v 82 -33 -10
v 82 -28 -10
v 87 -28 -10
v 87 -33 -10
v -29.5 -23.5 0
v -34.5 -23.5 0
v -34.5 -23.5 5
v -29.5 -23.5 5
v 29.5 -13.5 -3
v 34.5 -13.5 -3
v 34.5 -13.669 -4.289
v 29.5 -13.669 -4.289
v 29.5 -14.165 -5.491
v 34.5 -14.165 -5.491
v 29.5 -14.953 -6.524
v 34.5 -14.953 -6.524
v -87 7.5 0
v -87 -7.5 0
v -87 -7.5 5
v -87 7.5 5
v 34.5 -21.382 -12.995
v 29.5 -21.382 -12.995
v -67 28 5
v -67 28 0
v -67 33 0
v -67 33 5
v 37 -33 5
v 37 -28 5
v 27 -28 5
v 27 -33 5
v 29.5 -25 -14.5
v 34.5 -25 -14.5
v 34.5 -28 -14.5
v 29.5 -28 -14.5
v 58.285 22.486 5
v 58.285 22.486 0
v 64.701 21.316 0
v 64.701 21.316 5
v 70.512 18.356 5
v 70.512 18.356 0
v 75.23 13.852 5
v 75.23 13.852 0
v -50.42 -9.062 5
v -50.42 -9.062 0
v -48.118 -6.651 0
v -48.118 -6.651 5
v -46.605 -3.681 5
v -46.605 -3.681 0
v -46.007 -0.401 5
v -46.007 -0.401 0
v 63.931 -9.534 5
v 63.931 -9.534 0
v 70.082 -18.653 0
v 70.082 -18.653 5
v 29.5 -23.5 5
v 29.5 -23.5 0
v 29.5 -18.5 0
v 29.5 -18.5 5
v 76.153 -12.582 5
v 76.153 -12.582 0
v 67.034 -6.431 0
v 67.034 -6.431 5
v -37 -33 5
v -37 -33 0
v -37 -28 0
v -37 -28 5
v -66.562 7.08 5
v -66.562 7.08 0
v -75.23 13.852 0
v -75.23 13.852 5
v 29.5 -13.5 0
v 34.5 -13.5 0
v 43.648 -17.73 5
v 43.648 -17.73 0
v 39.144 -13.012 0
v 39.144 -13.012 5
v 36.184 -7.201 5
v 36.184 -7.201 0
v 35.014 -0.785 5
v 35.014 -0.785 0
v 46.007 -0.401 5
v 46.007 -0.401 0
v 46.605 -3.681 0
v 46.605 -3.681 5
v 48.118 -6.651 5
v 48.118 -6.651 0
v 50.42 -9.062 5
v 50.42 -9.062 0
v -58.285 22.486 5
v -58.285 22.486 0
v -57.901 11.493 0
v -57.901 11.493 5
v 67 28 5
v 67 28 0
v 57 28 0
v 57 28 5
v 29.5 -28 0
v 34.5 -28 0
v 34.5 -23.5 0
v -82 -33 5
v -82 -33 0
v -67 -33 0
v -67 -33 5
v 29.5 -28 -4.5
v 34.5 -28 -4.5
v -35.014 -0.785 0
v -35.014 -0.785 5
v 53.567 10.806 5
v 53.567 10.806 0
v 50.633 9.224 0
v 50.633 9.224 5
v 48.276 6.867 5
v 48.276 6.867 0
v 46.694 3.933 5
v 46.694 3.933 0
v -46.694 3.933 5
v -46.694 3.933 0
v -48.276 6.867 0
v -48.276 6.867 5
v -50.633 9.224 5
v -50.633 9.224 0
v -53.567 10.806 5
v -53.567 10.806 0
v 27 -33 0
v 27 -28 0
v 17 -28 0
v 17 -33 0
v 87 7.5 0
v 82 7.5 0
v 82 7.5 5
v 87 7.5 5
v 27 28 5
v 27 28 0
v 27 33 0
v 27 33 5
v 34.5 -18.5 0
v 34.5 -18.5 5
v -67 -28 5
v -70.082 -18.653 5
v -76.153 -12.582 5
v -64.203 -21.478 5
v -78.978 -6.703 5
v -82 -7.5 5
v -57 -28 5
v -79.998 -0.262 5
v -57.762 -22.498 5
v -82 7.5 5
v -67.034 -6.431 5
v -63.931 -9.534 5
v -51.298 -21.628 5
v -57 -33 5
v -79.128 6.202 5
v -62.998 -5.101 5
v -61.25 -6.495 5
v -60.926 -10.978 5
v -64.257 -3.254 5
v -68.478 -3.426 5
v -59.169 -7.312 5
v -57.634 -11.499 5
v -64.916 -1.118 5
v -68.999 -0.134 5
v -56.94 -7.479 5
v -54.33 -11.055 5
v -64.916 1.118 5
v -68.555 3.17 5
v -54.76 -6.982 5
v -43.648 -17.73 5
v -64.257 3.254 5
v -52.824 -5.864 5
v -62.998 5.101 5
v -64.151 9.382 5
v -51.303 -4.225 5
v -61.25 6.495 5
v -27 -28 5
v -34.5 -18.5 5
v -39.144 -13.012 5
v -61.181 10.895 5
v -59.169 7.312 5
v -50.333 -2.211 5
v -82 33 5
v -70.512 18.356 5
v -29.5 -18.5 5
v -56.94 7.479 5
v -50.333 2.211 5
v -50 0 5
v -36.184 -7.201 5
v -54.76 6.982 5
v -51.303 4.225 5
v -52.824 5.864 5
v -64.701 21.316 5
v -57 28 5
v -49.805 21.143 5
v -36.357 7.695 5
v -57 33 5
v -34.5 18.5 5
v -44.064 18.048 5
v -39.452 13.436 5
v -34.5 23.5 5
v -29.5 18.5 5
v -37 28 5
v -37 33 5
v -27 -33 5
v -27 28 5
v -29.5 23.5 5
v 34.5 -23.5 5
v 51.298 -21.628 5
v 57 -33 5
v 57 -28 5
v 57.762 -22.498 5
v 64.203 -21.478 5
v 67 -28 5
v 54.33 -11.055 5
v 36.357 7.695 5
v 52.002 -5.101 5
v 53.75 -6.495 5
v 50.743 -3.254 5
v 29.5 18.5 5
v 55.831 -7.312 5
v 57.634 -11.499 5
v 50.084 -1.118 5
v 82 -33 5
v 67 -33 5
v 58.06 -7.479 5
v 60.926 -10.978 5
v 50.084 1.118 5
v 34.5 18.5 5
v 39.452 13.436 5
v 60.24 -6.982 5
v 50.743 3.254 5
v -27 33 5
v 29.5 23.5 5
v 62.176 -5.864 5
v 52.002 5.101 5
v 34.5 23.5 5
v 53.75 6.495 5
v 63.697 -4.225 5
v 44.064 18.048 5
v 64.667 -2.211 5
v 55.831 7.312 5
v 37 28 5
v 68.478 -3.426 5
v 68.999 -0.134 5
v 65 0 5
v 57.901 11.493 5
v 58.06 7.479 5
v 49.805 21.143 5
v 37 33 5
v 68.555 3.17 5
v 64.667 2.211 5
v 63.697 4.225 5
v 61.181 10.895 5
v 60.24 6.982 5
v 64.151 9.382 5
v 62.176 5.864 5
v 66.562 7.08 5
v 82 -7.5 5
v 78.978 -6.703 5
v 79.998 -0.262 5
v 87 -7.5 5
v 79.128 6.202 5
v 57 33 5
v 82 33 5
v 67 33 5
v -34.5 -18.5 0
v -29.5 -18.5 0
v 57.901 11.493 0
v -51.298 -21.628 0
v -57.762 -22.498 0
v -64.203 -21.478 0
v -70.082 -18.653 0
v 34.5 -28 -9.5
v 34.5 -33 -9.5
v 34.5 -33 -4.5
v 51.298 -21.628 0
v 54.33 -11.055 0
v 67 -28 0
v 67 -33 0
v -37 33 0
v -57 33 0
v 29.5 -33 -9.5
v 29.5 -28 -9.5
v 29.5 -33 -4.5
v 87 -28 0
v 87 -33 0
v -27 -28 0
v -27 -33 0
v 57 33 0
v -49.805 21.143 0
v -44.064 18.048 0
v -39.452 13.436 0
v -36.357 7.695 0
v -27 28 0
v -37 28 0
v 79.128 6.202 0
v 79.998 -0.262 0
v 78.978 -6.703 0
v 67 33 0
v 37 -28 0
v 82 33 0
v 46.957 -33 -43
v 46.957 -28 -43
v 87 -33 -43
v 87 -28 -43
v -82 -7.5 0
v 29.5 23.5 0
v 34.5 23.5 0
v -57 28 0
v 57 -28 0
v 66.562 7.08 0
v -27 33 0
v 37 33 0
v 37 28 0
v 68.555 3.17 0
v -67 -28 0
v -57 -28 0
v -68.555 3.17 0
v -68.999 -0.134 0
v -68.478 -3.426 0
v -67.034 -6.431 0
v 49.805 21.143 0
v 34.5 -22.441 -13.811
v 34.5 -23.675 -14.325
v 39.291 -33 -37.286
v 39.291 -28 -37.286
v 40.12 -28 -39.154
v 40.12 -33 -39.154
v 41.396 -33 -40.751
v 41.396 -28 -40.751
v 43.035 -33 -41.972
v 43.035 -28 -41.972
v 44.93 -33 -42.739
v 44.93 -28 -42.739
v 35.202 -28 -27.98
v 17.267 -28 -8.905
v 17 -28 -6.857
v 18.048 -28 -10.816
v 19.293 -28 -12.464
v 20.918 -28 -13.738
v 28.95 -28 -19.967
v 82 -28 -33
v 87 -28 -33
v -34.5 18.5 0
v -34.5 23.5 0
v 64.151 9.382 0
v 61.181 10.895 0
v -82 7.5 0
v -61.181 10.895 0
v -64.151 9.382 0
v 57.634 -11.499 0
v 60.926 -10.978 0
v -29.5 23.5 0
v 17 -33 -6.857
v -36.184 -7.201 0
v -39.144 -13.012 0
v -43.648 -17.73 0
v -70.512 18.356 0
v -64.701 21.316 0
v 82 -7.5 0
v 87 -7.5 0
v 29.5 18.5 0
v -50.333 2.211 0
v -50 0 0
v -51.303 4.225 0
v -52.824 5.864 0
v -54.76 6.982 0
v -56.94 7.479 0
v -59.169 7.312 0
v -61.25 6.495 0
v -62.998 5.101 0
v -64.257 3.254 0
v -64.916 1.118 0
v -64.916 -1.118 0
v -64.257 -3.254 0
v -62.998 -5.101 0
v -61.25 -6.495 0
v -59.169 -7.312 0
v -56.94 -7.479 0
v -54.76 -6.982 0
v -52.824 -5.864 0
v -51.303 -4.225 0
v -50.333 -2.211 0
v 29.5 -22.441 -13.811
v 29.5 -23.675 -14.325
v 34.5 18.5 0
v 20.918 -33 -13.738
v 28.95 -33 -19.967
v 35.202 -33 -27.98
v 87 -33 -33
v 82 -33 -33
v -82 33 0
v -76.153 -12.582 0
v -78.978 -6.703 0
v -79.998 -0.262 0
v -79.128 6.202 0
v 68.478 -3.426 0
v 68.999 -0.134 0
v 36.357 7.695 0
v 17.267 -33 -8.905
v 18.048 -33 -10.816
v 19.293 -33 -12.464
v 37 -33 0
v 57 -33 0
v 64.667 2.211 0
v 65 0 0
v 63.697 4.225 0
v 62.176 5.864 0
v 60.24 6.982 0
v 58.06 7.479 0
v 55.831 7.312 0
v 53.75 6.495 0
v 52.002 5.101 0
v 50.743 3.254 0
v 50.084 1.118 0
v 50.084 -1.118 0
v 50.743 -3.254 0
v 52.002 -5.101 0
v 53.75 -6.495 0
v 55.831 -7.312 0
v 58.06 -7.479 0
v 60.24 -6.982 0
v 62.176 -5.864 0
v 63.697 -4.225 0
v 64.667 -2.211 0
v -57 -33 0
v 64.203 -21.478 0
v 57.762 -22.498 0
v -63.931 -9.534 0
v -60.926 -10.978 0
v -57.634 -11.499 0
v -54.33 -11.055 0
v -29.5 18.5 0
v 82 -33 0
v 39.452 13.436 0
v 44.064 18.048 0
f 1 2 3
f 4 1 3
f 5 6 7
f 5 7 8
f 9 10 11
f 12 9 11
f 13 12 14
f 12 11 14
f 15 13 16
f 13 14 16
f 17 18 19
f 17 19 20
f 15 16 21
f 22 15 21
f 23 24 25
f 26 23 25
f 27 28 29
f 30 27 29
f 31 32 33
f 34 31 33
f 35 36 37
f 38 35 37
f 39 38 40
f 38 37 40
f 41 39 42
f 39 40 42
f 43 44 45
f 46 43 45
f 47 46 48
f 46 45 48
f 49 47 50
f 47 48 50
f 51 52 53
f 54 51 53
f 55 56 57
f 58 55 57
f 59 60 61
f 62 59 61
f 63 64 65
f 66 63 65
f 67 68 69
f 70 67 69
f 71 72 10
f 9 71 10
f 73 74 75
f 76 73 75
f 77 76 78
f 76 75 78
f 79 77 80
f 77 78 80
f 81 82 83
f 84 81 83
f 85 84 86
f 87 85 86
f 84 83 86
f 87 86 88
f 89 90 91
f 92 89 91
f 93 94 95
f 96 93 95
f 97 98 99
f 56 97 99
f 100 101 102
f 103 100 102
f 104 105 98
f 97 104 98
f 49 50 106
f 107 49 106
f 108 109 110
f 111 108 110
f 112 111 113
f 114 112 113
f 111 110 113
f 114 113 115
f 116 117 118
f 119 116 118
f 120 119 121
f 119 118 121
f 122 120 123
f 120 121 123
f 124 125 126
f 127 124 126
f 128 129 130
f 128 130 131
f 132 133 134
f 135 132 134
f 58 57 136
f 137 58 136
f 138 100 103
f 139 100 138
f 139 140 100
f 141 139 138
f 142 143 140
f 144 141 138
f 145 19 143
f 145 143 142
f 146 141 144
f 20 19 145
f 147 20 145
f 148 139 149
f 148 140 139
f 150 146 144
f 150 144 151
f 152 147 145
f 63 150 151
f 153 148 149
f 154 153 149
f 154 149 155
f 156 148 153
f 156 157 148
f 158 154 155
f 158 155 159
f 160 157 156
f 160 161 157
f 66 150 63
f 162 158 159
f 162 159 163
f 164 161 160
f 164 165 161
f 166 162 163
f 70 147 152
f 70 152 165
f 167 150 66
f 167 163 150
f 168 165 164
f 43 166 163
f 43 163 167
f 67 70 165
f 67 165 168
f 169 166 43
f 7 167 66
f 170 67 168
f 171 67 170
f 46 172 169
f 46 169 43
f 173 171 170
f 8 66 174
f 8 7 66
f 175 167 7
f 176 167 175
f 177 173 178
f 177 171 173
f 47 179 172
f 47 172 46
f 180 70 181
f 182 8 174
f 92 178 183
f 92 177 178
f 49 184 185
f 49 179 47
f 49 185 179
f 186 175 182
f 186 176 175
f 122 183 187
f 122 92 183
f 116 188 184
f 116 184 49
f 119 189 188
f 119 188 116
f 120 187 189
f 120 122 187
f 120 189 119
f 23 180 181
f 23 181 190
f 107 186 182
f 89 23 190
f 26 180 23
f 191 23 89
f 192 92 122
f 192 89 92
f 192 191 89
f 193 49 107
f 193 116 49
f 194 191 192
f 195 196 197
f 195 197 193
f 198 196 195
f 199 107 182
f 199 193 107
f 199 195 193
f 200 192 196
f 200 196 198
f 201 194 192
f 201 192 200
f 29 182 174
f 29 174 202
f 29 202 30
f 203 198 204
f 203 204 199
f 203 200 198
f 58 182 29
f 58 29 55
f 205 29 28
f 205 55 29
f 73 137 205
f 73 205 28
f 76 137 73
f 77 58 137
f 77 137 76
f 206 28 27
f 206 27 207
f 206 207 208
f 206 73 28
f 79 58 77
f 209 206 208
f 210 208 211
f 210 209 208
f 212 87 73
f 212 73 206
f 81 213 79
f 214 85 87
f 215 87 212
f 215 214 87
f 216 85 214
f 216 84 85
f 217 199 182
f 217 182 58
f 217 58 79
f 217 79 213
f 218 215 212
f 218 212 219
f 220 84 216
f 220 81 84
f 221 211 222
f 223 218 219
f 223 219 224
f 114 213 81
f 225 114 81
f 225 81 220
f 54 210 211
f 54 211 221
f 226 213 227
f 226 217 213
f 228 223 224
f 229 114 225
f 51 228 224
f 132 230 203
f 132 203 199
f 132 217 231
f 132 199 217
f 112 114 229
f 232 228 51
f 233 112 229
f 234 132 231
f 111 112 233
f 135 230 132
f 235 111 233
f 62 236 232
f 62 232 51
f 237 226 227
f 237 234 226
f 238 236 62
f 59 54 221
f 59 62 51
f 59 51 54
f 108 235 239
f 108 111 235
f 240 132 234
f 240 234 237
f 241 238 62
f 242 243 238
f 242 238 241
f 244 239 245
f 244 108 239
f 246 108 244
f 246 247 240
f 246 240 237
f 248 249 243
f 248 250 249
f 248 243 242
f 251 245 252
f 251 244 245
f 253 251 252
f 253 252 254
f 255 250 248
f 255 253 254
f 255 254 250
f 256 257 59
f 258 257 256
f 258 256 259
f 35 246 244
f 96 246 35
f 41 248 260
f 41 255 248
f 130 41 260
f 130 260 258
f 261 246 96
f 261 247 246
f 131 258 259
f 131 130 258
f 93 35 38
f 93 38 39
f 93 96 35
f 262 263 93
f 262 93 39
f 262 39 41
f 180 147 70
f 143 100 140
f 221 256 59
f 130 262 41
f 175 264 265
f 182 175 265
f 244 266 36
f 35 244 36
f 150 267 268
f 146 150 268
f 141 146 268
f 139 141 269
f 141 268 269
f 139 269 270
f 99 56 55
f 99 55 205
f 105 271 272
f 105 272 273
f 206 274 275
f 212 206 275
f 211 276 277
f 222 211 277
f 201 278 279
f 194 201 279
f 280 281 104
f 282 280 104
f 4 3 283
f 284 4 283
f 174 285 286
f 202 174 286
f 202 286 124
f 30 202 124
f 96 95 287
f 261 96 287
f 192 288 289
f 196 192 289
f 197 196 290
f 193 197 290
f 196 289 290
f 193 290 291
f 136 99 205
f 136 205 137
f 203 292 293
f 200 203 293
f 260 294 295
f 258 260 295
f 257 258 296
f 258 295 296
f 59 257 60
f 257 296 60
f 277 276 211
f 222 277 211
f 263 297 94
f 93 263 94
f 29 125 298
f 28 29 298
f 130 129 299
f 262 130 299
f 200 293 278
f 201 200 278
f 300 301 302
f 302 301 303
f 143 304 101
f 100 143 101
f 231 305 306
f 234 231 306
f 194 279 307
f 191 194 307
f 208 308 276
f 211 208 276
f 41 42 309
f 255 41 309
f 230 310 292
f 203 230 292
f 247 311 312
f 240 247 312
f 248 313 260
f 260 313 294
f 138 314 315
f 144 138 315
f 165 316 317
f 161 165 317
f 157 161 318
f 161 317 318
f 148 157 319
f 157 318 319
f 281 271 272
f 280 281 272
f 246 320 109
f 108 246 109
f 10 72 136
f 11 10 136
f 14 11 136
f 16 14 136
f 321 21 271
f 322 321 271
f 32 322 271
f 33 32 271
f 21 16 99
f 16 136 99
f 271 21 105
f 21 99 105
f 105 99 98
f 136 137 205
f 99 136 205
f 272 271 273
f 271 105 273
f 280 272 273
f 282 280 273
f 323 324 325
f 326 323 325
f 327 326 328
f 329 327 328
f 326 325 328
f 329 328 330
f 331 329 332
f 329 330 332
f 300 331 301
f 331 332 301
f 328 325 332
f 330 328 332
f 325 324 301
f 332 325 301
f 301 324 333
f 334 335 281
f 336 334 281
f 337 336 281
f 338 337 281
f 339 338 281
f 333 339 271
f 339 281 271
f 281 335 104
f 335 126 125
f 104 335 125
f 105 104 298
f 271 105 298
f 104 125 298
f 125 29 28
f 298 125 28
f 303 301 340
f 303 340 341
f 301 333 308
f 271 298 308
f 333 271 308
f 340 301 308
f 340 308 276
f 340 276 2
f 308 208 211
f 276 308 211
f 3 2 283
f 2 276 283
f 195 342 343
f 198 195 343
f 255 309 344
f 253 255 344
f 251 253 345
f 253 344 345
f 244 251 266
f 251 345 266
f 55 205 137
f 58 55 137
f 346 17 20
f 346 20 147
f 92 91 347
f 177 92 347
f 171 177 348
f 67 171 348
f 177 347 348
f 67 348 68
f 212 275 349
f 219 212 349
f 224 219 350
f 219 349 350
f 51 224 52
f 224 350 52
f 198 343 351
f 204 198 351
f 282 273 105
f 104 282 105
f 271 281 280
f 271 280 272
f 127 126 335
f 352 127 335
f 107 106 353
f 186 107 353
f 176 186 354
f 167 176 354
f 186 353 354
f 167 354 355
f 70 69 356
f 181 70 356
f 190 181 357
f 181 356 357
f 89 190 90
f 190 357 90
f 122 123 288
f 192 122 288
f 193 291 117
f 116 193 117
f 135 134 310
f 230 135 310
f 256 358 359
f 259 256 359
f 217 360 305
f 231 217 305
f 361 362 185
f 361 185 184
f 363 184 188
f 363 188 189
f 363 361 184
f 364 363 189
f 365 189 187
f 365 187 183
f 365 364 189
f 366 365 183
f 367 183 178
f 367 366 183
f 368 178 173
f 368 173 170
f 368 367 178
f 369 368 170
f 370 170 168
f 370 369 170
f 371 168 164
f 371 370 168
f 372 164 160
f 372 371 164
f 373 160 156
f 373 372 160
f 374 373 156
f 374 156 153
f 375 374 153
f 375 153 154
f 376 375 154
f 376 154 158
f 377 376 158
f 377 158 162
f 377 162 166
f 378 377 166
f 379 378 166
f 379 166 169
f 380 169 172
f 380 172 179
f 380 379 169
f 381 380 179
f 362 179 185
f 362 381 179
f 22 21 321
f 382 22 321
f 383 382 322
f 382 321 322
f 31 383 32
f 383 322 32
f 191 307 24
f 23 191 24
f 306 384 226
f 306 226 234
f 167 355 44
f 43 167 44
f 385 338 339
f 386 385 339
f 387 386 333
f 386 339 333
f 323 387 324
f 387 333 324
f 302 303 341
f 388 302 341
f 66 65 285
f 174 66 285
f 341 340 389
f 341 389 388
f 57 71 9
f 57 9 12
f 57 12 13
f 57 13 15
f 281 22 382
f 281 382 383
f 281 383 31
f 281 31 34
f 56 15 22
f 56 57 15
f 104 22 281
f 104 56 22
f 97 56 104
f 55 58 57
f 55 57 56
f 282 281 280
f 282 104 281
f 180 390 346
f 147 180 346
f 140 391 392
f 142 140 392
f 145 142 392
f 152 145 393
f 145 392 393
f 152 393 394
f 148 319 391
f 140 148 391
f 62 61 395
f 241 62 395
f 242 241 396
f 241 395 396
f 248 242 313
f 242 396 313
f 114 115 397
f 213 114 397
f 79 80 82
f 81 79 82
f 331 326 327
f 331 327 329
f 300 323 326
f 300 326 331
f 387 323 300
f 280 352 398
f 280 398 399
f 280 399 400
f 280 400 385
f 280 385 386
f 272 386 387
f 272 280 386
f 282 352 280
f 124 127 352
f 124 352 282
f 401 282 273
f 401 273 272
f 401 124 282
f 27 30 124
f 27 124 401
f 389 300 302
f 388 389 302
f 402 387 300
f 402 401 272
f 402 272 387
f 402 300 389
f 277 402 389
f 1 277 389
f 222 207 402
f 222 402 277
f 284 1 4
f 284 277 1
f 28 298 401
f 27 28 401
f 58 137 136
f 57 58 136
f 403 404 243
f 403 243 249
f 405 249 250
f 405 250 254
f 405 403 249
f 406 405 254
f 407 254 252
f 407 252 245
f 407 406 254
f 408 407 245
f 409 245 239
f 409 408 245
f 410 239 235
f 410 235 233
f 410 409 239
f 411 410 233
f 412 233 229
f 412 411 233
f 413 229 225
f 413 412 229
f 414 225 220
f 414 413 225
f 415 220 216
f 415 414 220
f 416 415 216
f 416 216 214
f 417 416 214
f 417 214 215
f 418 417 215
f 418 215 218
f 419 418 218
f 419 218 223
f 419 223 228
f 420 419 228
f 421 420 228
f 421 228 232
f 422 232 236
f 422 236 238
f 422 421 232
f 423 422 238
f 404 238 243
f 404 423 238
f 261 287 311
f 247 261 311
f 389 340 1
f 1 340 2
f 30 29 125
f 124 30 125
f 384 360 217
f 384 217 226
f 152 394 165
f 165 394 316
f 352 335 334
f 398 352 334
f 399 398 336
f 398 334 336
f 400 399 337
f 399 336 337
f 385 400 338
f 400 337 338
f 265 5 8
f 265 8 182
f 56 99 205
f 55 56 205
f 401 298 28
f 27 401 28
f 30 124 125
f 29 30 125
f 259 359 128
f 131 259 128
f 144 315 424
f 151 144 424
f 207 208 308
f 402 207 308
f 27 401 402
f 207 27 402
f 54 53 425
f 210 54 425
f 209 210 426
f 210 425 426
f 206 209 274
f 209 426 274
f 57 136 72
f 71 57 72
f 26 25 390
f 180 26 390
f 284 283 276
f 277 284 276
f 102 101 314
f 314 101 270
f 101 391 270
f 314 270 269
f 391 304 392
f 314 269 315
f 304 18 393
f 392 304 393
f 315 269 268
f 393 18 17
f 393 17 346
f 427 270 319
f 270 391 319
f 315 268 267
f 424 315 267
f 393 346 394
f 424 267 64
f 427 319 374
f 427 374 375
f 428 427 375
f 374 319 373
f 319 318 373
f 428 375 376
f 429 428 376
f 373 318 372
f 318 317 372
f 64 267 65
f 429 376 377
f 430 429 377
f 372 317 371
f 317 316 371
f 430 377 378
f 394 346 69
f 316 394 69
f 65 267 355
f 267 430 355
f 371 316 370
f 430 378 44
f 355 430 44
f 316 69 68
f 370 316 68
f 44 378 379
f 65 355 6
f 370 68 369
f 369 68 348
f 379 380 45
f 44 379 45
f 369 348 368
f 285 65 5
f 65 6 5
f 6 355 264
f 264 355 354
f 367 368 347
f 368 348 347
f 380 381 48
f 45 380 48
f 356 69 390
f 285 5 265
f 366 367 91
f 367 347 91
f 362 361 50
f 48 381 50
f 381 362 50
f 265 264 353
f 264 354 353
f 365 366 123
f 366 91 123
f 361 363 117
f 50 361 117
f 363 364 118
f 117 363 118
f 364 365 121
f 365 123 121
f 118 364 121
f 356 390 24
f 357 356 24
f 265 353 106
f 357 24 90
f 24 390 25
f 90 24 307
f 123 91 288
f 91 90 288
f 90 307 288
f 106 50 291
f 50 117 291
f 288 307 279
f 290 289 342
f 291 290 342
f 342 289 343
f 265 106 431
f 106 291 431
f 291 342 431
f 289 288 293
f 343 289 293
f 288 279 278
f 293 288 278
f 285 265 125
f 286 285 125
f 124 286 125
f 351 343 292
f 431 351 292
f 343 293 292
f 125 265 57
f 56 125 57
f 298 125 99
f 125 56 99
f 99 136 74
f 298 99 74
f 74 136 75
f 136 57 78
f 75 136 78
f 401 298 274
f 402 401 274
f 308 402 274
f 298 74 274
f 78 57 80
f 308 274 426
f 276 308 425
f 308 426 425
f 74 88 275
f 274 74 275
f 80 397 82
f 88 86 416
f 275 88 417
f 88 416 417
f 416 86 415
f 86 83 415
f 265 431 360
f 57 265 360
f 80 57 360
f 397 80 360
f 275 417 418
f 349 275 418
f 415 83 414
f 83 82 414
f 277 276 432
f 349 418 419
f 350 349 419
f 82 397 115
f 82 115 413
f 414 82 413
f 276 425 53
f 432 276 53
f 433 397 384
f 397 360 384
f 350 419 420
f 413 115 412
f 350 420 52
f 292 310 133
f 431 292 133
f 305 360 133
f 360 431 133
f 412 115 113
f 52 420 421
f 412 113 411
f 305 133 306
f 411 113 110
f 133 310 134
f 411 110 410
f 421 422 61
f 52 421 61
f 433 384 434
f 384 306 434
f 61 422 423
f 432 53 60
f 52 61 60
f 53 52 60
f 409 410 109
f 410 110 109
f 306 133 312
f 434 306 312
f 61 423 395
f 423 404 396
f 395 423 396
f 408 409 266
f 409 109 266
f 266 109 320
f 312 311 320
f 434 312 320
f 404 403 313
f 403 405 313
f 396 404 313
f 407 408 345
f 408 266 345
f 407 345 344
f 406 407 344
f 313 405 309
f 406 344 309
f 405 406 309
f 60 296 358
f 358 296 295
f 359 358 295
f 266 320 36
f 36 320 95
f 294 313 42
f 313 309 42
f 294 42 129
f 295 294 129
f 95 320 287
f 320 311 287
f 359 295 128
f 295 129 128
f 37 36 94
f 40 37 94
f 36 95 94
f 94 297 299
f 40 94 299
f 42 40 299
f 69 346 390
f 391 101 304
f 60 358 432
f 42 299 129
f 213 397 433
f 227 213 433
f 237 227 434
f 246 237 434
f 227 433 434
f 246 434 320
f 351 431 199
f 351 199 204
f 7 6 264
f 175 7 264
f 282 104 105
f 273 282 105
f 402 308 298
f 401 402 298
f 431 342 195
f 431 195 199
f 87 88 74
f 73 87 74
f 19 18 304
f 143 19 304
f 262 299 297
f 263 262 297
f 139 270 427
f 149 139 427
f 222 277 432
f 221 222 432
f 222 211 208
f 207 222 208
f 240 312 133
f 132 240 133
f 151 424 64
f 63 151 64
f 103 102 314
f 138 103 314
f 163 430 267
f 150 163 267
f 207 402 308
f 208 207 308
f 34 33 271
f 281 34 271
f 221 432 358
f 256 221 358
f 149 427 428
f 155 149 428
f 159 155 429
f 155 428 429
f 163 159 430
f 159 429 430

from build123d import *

# Parameters (mm, degrees)
F0_W     = 5
F0_H     = 5
F0_R     = 7.5
F0_H_2   = 15
F1_DEPTH = 5
F2_W     = 5
F2_H     = 5
F2_H_2   = 10
F3_DEPTH = 5
F5_DEPTH = 5


with BuildPart() as f1:
    # F0 (on Top) → F1 (new body)
    with BuildSketch(Plane.XY):
        Polygon((-67, 33), (-82, 33), (-82, 7.5), (-82, -7.5), (-82, -33), (-67, -33), (-67, -28), (-57, -28), (-57, -33), (-37, -33), (-37, -28), (-27, -28), (-27, -33), (27, -33), (27, -28), (37, -28), (37, -33), (57, -33), (57, -28), (67, -28), (67, -33), (82, -33), (82, -7.5), (82, 7.5), (82, 33), (67, 33), (67, 28), (57, 28), (57, 33), (37, 33), (37, 28), (27, 28), (27, 33), (-27, 33), (-27, 28), (-37, 28), (-37, 33), (-57, 33), (-57, 28), (-67, 28), align=None)
        with Locations((-32, -21)):
            Rectangle(F0_W, F0_H, mode=Mode.SUBTRACT)
        with BuildLine():
            ThreePointArc((-51.298159, -21.628388), (-61.019775, -22.222988), (-70.08184, -18.653345))
            Line((-70.08184, -18.653345), (-63.930718, -9.533932))
            ThreePointArc((-63.930718, -9.533932), (-59.298996, -11.358416), (-54.33017, -11.05451))
            Line((-54.33017, -11.05451), (-51.298159, -21.628388))
        make_face(mode=Mode.SUBTRACT)
        with BuildLine():
            ThreePointArc((-76.153345, -12.58184), (-79.722988, -3.519775), (-79.128388, 6.201841))
            Line((-79.128388, 6.201841), (-68.55451, 3.16983))
            ThreePointArc((-68.55451, 3.16983), (-68.858416, -1.798996), (-67.033932, -6.430718))
            Line((-67.033932, -6.430718), (-76.153345, -12.58184))
        make_face(mode=Mode.SUBTRACT)
        with BuildLine():
            ThreePointArc((-35.013706, -0.785239), (-37.452353, -10.214786), (-43.647617, -17.730242))
            Line((-43.647617, -17.730242), (-50.419893, -9.062124))
            ThreePointArc((-50.419893, -9.062124), (-47.253425, -5.220891), (-46.007005, -0.401344))
            Line((-46.007005, -0.401344), (-35.013706, -0.785239))
        make_face(mode=Mode.SUBTRACT)
        with Locations((32, -21)):
            Rectangle(F0_W, F0_H, mode=Mode.SUBTRACT)
        with BuildLine():
            ThreePointArc((43.647617, -17.730242), (37.452353, -10.214786), (35.013706, -0.785239))
            Line((35.013706, -0.785239), (46.007005, -0.401344))
            ThreePointArc((46.007005, -0.401344), (47.253425, -5.220891), (50.419893, -9.062124))
            Line((50.419893, -9.062124), (43.647617, -17.730242))
        make_face(mode=Mode.SUBTRACT)
        with BuildLine():
            ThreePointArc((54.33017, -11.05451), (59.298996, -11.358416), (63.930718, -9.533932))
            Line((63.930718, -9.533932), (70.08184, -18.653345))
            ThreePointArc((70.08184, -18.653345), (61.019775, -22.222988), (51.298159, -21.628388))
            Line((51.298159, -21.628388), (54.33017, -11.05451))
        make_face(mode=Mode.SUBTRACT)
        with BuildLine():
            ThreePointArc((79.128388, 6.201841), (79.722988, -3.519775), (76.153345, -12.58184))
            Line((76.153345, -12.58184), (67.033932, -6.430718))
            ThreePointArc((67.033932, -6.430718), (68.858416, -1.798996), (68.55451, 3.16983))
            Line((68.55451, 3.16983), (79.128388, 6.201841))
        make_face(mode=Mode.SUBTRACT)
        with Locations((-57.5, 0)):
            Circle(F0_R, mode=Mode.SUBTRACT)
        with BuildLine():
            ThreePointArc((-75.230242, 13.852383), (-67.714786, 20.047647), (-58.285239, 22.486294))
            Line((-58.285239, 22.486294), (-57.901344, 11.492995))
            ThreePointArc((-57.901344, 11.492995), (-62.720891, 10.246575), (-66.562124, 7.080107))
            Line((-66.562124, 7.080107), (-75.230242, 13.852383))
        make_face(mode=Mode.SUBTRACT)
        with BuildLine():
            Line((-36.356916, 7.695453), (-46.693535, 3.933232))
            ThreePointArc((-46.693535, 3.933232), (-49.368272, 8.131728), (-53.566768, 10.806465))
            Line((-53.566768, 10.806465), (-49.804547, 21.143084))
            ThreePointArc((-49.804547, 21.143084), (-41.590097, 15.909903), (-36.356916, 7.695453))
        make_face(mode=Mode.SUBTRACT)
        with Locations((-32, 21)):
            Rectangle(F0_W, F0_H, mode=Mode.SUBTRACT)
        with Locations((57.5, 0)):
            Circle(F0_R, mode=Mode.SUBTRACT)
        with BuildLine():
            ThreePointArc((53.566768, 10.806465), (49.368272, 8.131728), (46.693535, 3.933232))
            Line((46.693535, 3.933232), (36.356916, 7.695453))
            ThreePointArc((36.356916, 7.695453), (41.590097, 15.909903), (49.804547, 21.143084))
            Line((49.804547, 21.143084), (53.566768, 10.806465))
        make_face(mode=Mode.SUBTRACT)
        with BuildLine():
            ThreePointArc((58.285239, 22.486294), (67.714786, 20.047647), (75.230242, 13.852383))
            Line((75.230242, 13.852383), (66.562124, 7.080107))
            ThreePointArc((66.562124, 7.080107), (62.720891, 10.246575), (57.901344, 11.492995))
            Line((57.901344, 11.492995), (58.285239, 22.486294))
        make_face(mode=Mode.SUBTRACT)
        with Locations((32, 21)):
            Rectangle(F0_W, F0_H, mode=Mode.SUBTRACT)
        with Locations((-84.5, 0)):
            Rectangle(F0_W, F0_H_2)
        with Locations((84.5, 0)):
            Rectangle(F0_W, F0_H_2)
    extrude(amount=F1_DEPTH)


with BuildPart() as f3:
    # F2 (on face) → F3 (new body)
    with BuildSketch(Plane.XZ.offset(28)):
        with BuildLine():
            Line((37, 5), (27, 5))
            Line((27, 5), (27, 0))
            Line((27, 0), (17, 0))
            Line((17, 0), (17, -6.857385))
            ThreePointArc((17, -6.857385), (18.048271, -10.816358), (20.918367, -13.737812))
            ThreePointArc((20.918367, -13.737812), (32.325147, -23.779278), (39.290909, -37.285714))
            ThreePointArc((39.290909, -37.285714), (42.176513, -41.41427), (46.957428, -43))
            Line((46.957428, -43), (82, -43))
            Line((82, -43), (82, -33))
            Line((82, -33), (82, -10))
            Line((82, -10), (82, 0))
            Line((82, 0), (67, 0))
            Line((67, 0), (67, 5))
            Line((67, 5), (57, 5))
            Line((57, 5), (57, 0))
            Line((57, 0), (37, 0))
            Line((37, 0), (37, 5))
        make_face()
        with Locations((32, -7)):
            Rectangle(F2_W, F2_H, mode=Mode.SUBTRACT)
        with Locations((84.5, -38)):
            Rectangle(F2_W, F2_H_2)
        with Locations((84.5, -5)):
            Rectangle(F2_W, F2_H_2)
    extrude(amount=F3_DEPTH)


with BuildPart() as f5:
    # F4 (on face) → F5 (new body)
    with BuildSketch(Plane(origin=(34.5, 0, 0), x_dir=(0, -1, 0), z_dir=(-1, 0, 0))):
        with BuildLine():
            Line((23.5, 5), (18.5, 5))
            Line((18.5, 5), (18.5, 0))
            Line((18.5, 0), (13.5, 0))
            Line((13.5, 0), (13.5, -3))
            ThreePointArc((13.5, -3), (13.877536, -4.905998), (14.953132, -6.524163))
            Line((14.953132, -6.524163), (21.382194, -12.994646))
            ThreePointArc((21.382194, -12.994646), (23.040752, -14.108646), (25, -14.5))
            Line((25, -14.5), (28, -14.5))
            Line((28, -14.5), (28, -9.5))
            Line((28, -9.5), (33, -9.5))
            Line((33, -9.5), (33, -4.5))
            Line((33, -4.5), (28, -4.5))
            Line((28, -4.5), (28, 0))
            Line((28, 0), (23.5, 0))
            Line((23.5, 0), (23.5, 5))
        make_face()
    extrude(amount=F5_DEPTH)


solid = Compound([f1.part, f3.part, f5.part])
